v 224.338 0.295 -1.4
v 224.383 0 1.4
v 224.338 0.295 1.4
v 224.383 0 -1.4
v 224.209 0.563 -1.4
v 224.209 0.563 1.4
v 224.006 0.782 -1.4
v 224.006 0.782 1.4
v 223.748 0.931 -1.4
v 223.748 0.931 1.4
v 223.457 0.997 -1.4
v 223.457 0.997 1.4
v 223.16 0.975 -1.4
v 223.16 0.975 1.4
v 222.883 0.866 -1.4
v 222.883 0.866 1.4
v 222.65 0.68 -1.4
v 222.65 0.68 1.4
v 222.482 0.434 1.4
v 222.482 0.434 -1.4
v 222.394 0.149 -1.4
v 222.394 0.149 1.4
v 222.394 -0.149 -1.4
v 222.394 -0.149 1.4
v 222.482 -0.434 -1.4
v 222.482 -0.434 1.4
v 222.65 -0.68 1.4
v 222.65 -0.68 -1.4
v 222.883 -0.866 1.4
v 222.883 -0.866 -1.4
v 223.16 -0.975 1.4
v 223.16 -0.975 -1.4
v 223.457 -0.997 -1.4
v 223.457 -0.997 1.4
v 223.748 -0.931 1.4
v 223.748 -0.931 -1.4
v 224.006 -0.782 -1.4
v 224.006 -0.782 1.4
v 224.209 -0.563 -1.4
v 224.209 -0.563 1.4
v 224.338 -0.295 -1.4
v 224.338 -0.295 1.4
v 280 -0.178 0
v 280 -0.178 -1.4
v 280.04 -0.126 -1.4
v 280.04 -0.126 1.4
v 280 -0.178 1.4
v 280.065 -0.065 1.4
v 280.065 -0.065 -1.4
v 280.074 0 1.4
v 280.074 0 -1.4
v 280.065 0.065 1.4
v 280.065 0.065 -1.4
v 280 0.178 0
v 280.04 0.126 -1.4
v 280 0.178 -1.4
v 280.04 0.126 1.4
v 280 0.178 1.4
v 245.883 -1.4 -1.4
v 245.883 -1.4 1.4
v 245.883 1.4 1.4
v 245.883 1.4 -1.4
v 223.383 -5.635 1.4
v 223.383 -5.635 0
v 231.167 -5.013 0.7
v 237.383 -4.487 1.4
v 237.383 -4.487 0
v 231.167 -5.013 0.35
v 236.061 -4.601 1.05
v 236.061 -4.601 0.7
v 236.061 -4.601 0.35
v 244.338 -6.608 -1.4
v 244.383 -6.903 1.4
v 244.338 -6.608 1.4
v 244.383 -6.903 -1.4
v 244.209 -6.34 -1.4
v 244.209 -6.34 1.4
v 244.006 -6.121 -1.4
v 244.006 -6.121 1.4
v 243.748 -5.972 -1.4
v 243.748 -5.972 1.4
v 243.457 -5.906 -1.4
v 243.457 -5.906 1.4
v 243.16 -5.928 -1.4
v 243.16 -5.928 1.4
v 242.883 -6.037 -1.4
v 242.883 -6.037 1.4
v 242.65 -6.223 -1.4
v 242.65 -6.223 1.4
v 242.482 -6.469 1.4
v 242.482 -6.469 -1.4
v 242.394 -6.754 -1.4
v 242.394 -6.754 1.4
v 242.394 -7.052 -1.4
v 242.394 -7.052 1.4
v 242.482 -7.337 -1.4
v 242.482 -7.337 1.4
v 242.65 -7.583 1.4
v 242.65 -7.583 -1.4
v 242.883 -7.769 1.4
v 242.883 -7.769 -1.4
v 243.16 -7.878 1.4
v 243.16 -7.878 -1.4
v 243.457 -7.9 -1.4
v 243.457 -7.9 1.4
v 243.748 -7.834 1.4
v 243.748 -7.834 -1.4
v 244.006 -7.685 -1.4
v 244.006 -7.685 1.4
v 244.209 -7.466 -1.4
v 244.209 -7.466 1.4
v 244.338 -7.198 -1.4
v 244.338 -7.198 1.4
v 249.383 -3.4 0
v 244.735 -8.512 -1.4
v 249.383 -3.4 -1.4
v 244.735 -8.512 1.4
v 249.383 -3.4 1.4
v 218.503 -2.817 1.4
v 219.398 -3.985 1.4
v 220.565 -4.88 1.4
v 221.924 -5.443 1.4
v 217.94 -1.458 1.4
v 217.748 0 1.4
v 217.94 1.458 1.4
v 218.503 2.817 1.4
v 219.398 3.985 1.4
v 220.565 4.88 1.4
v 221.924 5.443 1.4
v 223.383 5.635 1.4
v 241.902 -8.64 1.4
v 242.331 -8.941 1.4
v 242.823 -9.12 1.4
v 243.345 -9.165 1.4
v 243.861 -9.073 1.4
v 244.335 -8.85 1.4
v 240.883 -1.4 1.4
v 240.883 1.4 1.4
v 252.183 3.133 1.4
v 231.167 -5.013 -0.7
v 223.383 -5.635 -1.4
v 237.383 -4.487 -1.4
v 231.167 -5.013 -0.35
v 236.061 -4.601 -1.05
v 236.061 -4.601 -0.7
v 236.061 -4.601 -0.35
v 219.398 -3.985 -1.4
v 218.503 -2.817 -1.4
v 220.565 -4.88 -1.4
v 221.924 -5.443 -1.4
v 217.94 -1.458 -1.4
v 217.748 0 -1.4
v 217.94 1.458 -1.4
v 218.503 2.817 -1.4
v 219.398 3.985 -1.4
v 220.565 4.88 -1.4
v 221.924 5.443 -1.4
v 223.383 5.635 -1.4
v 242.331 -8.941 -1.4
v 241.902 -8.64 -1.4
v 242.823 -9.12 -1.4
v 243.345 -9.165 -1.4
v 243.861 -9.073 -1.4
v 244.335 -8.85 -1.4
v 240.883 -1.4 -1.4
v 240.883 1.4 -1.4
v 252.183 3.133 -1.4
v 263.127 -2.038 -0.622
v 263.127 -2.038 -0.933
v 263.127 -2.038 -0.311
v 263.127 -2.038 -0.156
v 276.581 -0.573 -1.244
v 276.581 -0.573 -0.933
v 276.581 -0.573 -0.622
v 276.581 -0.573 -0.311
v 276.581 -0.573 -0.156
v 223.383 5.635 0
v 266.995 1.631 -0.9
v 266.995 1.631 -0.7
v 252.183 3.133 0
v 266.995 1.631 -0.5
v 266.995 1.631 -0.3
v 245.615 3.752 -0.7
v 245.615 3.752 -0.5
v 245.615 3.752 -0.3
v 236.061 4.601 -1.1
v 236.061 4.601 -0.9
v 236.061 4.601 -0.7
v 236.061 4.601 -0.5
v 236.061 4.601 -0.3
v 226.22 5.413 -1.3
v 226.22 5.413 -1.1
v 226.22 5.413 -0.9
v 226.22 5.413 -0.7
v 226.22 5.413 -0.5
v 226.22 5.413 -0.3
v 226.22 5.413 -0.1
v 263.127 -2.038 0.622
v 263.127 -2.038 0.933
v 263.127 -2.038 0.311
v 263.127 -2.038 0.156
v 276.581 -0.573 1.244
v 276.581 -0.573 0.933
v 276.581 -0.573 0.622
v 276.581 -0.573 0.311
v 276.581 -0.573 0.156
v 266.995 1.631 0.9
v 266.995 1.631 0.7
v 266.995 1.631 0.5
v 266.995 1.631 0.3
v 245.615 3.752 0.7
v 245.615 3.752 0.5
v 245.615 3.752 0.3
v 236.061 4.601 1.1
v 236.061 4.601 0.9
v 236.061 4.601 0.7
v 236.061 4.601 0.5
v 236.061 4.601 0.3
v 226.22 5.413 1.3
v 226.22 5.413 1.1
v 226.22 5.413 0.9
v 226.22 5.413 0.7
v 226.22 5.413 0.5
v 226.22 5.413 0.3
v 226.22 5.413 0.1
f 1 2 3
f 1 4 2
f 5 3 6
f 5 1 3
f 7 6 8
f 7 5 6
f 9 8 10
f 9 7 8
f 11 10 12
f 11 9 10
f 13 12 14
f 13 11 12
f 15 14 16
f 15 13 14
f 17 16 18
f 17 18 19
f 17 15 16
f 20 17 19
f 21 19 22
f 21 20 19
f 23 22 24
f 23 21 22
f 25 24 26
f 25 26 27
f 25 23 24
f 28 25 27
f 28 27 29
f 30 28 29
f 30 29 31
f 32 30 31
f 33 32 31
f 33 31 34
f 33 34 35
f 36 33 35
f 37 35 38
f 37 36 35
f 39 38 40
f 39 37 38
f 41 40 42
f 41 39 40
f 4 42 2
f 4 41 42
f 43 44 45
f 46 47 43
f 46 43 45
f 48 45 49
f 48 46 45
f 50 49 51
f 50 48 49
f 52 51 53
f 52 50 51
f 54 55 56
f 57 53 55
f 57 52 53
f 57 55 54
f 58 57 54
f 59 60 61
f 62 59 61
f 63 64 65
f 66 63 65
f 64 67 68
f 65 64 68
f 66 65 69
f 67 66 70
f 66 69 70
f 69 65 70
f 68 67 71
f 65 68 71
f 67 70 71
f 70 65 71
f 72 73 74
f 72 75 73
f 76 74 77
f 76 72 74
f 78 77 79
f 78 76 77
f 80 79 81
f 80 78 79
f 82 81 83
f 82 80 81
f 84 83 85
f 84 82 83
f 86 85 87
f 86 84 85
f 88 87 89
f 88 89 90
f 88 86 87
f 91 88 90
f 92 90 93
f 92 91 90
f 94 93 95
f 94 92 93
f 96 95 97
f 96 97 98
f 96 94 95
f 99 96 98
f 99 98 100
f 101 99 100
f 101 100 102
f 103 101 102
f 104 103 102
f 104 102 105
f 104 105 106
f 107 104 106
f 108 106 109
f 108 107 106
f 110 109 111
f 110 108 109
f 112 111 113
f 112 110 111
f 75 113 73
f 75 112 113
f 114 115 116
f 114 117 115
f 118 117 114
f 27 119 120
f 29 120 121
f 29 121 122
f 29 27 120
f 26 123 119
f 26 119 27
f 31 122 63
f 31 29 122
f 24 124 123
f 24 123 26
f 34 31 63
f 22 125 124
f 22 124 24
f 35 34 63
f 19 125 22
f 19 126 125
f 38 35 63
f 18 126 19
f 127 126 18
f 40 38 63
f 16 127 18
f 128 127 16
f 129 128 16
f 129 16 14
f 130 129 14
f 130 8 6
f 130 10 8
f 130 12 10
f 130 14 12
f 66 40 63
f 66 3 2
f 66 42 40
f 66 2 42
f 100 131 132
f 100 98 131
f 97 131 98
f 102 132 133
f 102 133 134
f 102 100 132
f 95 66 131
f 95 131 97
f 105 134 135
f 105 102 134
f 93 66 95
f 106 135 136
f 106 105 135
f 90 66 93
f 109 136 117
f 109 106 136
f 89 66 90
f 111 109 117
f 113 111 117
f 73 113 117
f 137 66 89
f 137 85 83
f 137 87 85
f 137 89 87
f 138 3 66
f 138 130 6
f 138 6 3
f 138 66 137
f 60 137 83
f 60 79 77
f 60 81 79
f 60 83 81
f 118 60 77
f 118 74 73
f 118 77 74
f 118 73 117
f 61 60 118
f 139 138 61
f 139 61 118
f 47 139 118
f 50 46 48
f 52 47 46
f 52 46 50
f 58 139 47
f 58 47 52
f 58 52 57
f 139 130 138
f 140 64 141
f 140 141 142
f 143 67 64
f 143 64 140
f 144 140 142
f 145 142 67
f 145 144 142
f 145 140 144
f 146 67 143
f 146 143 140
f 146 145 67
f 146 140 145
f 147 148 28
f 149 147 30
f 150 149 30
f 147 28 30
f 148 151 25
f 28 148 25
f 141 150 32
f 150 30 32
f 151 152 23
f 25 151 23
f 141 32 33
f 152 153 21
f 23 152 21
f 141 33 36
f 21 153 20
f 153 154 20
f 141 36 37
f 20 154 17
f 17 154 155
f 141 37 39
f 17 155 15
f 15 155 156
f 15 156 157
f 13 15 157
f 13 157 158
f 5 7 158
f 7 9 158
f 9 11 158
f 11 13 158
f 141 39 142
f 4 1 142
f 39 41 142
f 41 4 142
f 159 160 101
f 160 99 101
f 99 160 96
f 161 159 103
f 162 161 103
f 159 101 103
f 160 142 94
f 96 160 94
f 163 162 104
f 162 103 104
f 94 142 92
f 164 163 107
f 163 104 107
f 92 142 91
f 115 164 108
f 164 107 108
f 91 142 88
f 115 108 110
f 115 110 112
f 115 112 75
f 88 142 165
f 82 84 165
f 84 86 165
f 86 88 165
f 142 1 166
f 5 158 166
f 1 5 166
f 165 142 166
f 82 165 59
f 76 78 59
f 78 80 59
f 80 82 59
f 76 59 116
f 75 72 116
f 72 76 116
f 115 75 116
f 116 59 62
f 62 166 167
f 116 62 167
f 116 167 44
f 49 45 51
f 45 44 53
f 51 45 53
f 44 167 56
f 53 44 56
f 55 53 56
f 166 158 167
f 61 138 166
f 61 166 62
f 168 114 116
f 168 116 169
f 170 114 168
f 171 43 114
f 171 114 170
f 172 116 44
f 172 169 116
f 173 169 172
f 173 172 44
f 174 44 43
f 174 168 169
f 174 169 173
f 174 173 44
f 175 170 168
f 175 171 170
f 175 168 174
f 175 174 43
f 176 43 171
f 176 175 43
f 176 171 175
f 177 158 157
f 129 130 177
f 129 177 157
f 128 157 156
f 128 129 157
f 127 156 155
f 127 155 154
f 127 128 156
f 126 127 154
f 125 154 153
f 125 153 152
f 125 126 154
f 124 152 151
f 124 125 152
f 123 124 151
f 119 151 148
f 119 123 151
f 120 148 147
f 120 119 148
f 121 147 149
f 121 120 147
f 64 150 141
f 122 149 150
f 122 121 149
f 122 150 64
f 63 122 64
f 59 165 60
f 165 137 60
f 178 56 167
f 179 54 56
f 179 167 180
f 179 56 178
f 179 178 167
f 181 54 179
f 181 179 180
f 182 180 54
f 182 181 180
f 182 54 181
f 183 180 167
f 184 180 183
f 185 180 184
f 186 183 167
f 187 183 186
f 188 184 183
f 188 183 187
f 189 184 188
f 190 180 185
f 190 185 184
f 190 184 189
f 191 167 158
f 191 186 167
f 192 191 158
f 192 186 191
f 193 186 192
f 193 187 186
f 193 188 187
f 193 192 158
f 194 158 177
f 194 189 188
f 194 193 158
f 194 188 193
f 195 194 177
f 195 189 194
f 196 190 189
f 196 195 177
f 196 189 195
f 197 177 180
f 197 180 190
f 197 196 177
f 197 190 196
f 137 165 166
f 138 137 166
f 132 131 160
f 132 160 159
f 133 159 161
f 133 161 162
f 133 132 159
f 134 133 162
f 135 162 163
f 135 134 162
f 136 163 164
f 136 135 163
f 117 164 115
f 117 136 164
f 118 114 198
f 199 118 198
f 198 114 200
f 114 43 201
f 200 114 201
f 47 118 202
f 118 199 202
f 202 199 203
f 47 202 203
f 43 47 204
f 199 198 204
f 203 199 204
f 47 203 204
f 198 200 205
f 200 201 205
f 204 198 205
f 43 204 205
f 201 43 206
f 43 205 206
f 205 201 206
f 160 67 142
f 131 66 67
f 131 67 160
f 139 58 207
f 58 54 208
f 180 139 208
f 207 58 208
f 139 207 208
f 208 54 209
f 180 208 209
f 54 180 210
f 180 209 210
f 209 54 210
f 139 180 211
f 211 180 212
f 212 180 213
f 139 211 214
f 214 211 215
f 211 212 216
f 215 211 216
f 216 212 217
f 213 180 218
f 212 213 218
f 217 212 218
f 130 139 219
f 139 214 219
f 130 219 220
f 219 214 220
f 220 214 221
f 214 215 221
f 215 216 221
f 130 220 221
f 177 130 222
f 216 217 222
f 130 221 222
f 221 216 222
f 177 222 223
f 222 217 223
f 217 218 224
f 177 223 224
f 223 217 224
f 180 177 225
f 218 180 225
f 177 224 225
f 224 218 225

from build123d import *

# Parameters (mm, degrees)
SKETCH_1_R      = 1
SKETCH_1_W      = 5
SKETCH_1_H      = 2.8
EXTRUDE_1_DEPTH = 1.4


with BuildPart() as part:
    # Эскиз1 → Бобышка-Вытянуть1 (new, symmetric)
    with BuildSketch(Plane.XY):
        with BuildLine():
            ThreePointArc((223.382624747, 5.634990628), (219.398084745, 3.984540168), (217.747634119, 2.35e-07))
            ThreePointArc((217.747634119, 2.35e-07), (219.398084579, -3.984540002), (223.382624747, -5.634990628))
            add(Edge.make_bspline(
                [(223.382624746, -5.634990613), (224.328656864, -5.56201019), (226.923894547, -5.35916654), (231.150377303, -5.017351086), (234.870714804, -4.704112055), (236.94221324, -4.525459463), (237.382624747, -4.487285848)],
                knots=[0.670161589, 0.670161589, 0.670161589, 0.670161589, 0.686667237, 0.715444849, 0.743923546, 0.751613474, 0.751613474, 0.751613474, 0.751613474], degree=3))
            Line((237.382624747, -4.487285848), (241.902085906, -8.639702096))
            ThreePointArc((241.902085906, -8.639702096), (243.345073916, -9.164930306), (244.73509722, -8.51230922))
            Line((244.73509722, -8.51230922), (249.382624747, -3.400128388))
            add(Edge.make_bspline(
                [(249.382624747, -3.400128388), (251.158571989, -3.232274224), (254.371192488, -2.923000161), (258.952644662, -2.467188138), (263.047743378, -2.047856604), (266.898988862, -1.642607304), (270.455833183, -1.258590905), (273.651166984, -0.905304265), (276.385426802, -0.596436482), (278.45259621, -0.358958361), (279.592043704, -0.226075898), (280, -0.1785)],
                knots=[0.821480844, 0.821480844, 0.821480844, 0.821480844, 0.852512115, 0.877624446, 0.901571134, 0.924121062, 0.944988816, 0.963803939, 0.980044339, 0.992855276, 1, 1, 1, 1], degree=3))
            ThreePointArc((280, -0.1785), (280.073937121, 0), (280, 0.1785))
            add(Edge.make_bspline(
                [(280, 0.1785), (279.592043704, 0.226075898), (278.45259621, 0.358958361), (276.385426802, 0.596436482), (273.651166984, 0.905304265), (270.455833183, 1.258590905), (266.898988862, 1.642607304), (263.047743378, 2.047856604), (258.952644662, 2.467188138), (253.116111921, 3.047869044), (247.071089236, 3.62220531), (240.854179313, 4.184912649), (236.038226964, 4.605811749), (231.150377303, 5.017351103), (226.923894547, 5.359166556), (224.328656864, 5.562010205), (223.382624747, 5.634990628)],
                knots=[0, 0, 0, 0, 0.007144724, 0.019955661, 0.036196061, 0.055011184, 0.075878938, 0.098428866, 0.122375554, 0.147487885, 0.200459747, 0.22800517, 0.256076454, 0.284555151, 0.313332763, 0.329838411, 0.329838411, 0.329838411, 0.329838411], degree=3))
        make_face()
        with Locations((243.382624747, -6.903125596)):
            Circle(SKETCH_1_R, mode=Mode.SUBTRACT)
        with Locations((223.382624747, 0)):
            Circle(SKETCH_1_R, mode=Mode.SUBTRACT)
        with Locations((243.382624747, 0)):
            Rectangle(SKETCH_1_W, SKETCH_1_H, mode=Mode.SUBTRACT)
    extrude(amount=EXTRUDE_1_DEPTH, both=True)


solid = part.part
